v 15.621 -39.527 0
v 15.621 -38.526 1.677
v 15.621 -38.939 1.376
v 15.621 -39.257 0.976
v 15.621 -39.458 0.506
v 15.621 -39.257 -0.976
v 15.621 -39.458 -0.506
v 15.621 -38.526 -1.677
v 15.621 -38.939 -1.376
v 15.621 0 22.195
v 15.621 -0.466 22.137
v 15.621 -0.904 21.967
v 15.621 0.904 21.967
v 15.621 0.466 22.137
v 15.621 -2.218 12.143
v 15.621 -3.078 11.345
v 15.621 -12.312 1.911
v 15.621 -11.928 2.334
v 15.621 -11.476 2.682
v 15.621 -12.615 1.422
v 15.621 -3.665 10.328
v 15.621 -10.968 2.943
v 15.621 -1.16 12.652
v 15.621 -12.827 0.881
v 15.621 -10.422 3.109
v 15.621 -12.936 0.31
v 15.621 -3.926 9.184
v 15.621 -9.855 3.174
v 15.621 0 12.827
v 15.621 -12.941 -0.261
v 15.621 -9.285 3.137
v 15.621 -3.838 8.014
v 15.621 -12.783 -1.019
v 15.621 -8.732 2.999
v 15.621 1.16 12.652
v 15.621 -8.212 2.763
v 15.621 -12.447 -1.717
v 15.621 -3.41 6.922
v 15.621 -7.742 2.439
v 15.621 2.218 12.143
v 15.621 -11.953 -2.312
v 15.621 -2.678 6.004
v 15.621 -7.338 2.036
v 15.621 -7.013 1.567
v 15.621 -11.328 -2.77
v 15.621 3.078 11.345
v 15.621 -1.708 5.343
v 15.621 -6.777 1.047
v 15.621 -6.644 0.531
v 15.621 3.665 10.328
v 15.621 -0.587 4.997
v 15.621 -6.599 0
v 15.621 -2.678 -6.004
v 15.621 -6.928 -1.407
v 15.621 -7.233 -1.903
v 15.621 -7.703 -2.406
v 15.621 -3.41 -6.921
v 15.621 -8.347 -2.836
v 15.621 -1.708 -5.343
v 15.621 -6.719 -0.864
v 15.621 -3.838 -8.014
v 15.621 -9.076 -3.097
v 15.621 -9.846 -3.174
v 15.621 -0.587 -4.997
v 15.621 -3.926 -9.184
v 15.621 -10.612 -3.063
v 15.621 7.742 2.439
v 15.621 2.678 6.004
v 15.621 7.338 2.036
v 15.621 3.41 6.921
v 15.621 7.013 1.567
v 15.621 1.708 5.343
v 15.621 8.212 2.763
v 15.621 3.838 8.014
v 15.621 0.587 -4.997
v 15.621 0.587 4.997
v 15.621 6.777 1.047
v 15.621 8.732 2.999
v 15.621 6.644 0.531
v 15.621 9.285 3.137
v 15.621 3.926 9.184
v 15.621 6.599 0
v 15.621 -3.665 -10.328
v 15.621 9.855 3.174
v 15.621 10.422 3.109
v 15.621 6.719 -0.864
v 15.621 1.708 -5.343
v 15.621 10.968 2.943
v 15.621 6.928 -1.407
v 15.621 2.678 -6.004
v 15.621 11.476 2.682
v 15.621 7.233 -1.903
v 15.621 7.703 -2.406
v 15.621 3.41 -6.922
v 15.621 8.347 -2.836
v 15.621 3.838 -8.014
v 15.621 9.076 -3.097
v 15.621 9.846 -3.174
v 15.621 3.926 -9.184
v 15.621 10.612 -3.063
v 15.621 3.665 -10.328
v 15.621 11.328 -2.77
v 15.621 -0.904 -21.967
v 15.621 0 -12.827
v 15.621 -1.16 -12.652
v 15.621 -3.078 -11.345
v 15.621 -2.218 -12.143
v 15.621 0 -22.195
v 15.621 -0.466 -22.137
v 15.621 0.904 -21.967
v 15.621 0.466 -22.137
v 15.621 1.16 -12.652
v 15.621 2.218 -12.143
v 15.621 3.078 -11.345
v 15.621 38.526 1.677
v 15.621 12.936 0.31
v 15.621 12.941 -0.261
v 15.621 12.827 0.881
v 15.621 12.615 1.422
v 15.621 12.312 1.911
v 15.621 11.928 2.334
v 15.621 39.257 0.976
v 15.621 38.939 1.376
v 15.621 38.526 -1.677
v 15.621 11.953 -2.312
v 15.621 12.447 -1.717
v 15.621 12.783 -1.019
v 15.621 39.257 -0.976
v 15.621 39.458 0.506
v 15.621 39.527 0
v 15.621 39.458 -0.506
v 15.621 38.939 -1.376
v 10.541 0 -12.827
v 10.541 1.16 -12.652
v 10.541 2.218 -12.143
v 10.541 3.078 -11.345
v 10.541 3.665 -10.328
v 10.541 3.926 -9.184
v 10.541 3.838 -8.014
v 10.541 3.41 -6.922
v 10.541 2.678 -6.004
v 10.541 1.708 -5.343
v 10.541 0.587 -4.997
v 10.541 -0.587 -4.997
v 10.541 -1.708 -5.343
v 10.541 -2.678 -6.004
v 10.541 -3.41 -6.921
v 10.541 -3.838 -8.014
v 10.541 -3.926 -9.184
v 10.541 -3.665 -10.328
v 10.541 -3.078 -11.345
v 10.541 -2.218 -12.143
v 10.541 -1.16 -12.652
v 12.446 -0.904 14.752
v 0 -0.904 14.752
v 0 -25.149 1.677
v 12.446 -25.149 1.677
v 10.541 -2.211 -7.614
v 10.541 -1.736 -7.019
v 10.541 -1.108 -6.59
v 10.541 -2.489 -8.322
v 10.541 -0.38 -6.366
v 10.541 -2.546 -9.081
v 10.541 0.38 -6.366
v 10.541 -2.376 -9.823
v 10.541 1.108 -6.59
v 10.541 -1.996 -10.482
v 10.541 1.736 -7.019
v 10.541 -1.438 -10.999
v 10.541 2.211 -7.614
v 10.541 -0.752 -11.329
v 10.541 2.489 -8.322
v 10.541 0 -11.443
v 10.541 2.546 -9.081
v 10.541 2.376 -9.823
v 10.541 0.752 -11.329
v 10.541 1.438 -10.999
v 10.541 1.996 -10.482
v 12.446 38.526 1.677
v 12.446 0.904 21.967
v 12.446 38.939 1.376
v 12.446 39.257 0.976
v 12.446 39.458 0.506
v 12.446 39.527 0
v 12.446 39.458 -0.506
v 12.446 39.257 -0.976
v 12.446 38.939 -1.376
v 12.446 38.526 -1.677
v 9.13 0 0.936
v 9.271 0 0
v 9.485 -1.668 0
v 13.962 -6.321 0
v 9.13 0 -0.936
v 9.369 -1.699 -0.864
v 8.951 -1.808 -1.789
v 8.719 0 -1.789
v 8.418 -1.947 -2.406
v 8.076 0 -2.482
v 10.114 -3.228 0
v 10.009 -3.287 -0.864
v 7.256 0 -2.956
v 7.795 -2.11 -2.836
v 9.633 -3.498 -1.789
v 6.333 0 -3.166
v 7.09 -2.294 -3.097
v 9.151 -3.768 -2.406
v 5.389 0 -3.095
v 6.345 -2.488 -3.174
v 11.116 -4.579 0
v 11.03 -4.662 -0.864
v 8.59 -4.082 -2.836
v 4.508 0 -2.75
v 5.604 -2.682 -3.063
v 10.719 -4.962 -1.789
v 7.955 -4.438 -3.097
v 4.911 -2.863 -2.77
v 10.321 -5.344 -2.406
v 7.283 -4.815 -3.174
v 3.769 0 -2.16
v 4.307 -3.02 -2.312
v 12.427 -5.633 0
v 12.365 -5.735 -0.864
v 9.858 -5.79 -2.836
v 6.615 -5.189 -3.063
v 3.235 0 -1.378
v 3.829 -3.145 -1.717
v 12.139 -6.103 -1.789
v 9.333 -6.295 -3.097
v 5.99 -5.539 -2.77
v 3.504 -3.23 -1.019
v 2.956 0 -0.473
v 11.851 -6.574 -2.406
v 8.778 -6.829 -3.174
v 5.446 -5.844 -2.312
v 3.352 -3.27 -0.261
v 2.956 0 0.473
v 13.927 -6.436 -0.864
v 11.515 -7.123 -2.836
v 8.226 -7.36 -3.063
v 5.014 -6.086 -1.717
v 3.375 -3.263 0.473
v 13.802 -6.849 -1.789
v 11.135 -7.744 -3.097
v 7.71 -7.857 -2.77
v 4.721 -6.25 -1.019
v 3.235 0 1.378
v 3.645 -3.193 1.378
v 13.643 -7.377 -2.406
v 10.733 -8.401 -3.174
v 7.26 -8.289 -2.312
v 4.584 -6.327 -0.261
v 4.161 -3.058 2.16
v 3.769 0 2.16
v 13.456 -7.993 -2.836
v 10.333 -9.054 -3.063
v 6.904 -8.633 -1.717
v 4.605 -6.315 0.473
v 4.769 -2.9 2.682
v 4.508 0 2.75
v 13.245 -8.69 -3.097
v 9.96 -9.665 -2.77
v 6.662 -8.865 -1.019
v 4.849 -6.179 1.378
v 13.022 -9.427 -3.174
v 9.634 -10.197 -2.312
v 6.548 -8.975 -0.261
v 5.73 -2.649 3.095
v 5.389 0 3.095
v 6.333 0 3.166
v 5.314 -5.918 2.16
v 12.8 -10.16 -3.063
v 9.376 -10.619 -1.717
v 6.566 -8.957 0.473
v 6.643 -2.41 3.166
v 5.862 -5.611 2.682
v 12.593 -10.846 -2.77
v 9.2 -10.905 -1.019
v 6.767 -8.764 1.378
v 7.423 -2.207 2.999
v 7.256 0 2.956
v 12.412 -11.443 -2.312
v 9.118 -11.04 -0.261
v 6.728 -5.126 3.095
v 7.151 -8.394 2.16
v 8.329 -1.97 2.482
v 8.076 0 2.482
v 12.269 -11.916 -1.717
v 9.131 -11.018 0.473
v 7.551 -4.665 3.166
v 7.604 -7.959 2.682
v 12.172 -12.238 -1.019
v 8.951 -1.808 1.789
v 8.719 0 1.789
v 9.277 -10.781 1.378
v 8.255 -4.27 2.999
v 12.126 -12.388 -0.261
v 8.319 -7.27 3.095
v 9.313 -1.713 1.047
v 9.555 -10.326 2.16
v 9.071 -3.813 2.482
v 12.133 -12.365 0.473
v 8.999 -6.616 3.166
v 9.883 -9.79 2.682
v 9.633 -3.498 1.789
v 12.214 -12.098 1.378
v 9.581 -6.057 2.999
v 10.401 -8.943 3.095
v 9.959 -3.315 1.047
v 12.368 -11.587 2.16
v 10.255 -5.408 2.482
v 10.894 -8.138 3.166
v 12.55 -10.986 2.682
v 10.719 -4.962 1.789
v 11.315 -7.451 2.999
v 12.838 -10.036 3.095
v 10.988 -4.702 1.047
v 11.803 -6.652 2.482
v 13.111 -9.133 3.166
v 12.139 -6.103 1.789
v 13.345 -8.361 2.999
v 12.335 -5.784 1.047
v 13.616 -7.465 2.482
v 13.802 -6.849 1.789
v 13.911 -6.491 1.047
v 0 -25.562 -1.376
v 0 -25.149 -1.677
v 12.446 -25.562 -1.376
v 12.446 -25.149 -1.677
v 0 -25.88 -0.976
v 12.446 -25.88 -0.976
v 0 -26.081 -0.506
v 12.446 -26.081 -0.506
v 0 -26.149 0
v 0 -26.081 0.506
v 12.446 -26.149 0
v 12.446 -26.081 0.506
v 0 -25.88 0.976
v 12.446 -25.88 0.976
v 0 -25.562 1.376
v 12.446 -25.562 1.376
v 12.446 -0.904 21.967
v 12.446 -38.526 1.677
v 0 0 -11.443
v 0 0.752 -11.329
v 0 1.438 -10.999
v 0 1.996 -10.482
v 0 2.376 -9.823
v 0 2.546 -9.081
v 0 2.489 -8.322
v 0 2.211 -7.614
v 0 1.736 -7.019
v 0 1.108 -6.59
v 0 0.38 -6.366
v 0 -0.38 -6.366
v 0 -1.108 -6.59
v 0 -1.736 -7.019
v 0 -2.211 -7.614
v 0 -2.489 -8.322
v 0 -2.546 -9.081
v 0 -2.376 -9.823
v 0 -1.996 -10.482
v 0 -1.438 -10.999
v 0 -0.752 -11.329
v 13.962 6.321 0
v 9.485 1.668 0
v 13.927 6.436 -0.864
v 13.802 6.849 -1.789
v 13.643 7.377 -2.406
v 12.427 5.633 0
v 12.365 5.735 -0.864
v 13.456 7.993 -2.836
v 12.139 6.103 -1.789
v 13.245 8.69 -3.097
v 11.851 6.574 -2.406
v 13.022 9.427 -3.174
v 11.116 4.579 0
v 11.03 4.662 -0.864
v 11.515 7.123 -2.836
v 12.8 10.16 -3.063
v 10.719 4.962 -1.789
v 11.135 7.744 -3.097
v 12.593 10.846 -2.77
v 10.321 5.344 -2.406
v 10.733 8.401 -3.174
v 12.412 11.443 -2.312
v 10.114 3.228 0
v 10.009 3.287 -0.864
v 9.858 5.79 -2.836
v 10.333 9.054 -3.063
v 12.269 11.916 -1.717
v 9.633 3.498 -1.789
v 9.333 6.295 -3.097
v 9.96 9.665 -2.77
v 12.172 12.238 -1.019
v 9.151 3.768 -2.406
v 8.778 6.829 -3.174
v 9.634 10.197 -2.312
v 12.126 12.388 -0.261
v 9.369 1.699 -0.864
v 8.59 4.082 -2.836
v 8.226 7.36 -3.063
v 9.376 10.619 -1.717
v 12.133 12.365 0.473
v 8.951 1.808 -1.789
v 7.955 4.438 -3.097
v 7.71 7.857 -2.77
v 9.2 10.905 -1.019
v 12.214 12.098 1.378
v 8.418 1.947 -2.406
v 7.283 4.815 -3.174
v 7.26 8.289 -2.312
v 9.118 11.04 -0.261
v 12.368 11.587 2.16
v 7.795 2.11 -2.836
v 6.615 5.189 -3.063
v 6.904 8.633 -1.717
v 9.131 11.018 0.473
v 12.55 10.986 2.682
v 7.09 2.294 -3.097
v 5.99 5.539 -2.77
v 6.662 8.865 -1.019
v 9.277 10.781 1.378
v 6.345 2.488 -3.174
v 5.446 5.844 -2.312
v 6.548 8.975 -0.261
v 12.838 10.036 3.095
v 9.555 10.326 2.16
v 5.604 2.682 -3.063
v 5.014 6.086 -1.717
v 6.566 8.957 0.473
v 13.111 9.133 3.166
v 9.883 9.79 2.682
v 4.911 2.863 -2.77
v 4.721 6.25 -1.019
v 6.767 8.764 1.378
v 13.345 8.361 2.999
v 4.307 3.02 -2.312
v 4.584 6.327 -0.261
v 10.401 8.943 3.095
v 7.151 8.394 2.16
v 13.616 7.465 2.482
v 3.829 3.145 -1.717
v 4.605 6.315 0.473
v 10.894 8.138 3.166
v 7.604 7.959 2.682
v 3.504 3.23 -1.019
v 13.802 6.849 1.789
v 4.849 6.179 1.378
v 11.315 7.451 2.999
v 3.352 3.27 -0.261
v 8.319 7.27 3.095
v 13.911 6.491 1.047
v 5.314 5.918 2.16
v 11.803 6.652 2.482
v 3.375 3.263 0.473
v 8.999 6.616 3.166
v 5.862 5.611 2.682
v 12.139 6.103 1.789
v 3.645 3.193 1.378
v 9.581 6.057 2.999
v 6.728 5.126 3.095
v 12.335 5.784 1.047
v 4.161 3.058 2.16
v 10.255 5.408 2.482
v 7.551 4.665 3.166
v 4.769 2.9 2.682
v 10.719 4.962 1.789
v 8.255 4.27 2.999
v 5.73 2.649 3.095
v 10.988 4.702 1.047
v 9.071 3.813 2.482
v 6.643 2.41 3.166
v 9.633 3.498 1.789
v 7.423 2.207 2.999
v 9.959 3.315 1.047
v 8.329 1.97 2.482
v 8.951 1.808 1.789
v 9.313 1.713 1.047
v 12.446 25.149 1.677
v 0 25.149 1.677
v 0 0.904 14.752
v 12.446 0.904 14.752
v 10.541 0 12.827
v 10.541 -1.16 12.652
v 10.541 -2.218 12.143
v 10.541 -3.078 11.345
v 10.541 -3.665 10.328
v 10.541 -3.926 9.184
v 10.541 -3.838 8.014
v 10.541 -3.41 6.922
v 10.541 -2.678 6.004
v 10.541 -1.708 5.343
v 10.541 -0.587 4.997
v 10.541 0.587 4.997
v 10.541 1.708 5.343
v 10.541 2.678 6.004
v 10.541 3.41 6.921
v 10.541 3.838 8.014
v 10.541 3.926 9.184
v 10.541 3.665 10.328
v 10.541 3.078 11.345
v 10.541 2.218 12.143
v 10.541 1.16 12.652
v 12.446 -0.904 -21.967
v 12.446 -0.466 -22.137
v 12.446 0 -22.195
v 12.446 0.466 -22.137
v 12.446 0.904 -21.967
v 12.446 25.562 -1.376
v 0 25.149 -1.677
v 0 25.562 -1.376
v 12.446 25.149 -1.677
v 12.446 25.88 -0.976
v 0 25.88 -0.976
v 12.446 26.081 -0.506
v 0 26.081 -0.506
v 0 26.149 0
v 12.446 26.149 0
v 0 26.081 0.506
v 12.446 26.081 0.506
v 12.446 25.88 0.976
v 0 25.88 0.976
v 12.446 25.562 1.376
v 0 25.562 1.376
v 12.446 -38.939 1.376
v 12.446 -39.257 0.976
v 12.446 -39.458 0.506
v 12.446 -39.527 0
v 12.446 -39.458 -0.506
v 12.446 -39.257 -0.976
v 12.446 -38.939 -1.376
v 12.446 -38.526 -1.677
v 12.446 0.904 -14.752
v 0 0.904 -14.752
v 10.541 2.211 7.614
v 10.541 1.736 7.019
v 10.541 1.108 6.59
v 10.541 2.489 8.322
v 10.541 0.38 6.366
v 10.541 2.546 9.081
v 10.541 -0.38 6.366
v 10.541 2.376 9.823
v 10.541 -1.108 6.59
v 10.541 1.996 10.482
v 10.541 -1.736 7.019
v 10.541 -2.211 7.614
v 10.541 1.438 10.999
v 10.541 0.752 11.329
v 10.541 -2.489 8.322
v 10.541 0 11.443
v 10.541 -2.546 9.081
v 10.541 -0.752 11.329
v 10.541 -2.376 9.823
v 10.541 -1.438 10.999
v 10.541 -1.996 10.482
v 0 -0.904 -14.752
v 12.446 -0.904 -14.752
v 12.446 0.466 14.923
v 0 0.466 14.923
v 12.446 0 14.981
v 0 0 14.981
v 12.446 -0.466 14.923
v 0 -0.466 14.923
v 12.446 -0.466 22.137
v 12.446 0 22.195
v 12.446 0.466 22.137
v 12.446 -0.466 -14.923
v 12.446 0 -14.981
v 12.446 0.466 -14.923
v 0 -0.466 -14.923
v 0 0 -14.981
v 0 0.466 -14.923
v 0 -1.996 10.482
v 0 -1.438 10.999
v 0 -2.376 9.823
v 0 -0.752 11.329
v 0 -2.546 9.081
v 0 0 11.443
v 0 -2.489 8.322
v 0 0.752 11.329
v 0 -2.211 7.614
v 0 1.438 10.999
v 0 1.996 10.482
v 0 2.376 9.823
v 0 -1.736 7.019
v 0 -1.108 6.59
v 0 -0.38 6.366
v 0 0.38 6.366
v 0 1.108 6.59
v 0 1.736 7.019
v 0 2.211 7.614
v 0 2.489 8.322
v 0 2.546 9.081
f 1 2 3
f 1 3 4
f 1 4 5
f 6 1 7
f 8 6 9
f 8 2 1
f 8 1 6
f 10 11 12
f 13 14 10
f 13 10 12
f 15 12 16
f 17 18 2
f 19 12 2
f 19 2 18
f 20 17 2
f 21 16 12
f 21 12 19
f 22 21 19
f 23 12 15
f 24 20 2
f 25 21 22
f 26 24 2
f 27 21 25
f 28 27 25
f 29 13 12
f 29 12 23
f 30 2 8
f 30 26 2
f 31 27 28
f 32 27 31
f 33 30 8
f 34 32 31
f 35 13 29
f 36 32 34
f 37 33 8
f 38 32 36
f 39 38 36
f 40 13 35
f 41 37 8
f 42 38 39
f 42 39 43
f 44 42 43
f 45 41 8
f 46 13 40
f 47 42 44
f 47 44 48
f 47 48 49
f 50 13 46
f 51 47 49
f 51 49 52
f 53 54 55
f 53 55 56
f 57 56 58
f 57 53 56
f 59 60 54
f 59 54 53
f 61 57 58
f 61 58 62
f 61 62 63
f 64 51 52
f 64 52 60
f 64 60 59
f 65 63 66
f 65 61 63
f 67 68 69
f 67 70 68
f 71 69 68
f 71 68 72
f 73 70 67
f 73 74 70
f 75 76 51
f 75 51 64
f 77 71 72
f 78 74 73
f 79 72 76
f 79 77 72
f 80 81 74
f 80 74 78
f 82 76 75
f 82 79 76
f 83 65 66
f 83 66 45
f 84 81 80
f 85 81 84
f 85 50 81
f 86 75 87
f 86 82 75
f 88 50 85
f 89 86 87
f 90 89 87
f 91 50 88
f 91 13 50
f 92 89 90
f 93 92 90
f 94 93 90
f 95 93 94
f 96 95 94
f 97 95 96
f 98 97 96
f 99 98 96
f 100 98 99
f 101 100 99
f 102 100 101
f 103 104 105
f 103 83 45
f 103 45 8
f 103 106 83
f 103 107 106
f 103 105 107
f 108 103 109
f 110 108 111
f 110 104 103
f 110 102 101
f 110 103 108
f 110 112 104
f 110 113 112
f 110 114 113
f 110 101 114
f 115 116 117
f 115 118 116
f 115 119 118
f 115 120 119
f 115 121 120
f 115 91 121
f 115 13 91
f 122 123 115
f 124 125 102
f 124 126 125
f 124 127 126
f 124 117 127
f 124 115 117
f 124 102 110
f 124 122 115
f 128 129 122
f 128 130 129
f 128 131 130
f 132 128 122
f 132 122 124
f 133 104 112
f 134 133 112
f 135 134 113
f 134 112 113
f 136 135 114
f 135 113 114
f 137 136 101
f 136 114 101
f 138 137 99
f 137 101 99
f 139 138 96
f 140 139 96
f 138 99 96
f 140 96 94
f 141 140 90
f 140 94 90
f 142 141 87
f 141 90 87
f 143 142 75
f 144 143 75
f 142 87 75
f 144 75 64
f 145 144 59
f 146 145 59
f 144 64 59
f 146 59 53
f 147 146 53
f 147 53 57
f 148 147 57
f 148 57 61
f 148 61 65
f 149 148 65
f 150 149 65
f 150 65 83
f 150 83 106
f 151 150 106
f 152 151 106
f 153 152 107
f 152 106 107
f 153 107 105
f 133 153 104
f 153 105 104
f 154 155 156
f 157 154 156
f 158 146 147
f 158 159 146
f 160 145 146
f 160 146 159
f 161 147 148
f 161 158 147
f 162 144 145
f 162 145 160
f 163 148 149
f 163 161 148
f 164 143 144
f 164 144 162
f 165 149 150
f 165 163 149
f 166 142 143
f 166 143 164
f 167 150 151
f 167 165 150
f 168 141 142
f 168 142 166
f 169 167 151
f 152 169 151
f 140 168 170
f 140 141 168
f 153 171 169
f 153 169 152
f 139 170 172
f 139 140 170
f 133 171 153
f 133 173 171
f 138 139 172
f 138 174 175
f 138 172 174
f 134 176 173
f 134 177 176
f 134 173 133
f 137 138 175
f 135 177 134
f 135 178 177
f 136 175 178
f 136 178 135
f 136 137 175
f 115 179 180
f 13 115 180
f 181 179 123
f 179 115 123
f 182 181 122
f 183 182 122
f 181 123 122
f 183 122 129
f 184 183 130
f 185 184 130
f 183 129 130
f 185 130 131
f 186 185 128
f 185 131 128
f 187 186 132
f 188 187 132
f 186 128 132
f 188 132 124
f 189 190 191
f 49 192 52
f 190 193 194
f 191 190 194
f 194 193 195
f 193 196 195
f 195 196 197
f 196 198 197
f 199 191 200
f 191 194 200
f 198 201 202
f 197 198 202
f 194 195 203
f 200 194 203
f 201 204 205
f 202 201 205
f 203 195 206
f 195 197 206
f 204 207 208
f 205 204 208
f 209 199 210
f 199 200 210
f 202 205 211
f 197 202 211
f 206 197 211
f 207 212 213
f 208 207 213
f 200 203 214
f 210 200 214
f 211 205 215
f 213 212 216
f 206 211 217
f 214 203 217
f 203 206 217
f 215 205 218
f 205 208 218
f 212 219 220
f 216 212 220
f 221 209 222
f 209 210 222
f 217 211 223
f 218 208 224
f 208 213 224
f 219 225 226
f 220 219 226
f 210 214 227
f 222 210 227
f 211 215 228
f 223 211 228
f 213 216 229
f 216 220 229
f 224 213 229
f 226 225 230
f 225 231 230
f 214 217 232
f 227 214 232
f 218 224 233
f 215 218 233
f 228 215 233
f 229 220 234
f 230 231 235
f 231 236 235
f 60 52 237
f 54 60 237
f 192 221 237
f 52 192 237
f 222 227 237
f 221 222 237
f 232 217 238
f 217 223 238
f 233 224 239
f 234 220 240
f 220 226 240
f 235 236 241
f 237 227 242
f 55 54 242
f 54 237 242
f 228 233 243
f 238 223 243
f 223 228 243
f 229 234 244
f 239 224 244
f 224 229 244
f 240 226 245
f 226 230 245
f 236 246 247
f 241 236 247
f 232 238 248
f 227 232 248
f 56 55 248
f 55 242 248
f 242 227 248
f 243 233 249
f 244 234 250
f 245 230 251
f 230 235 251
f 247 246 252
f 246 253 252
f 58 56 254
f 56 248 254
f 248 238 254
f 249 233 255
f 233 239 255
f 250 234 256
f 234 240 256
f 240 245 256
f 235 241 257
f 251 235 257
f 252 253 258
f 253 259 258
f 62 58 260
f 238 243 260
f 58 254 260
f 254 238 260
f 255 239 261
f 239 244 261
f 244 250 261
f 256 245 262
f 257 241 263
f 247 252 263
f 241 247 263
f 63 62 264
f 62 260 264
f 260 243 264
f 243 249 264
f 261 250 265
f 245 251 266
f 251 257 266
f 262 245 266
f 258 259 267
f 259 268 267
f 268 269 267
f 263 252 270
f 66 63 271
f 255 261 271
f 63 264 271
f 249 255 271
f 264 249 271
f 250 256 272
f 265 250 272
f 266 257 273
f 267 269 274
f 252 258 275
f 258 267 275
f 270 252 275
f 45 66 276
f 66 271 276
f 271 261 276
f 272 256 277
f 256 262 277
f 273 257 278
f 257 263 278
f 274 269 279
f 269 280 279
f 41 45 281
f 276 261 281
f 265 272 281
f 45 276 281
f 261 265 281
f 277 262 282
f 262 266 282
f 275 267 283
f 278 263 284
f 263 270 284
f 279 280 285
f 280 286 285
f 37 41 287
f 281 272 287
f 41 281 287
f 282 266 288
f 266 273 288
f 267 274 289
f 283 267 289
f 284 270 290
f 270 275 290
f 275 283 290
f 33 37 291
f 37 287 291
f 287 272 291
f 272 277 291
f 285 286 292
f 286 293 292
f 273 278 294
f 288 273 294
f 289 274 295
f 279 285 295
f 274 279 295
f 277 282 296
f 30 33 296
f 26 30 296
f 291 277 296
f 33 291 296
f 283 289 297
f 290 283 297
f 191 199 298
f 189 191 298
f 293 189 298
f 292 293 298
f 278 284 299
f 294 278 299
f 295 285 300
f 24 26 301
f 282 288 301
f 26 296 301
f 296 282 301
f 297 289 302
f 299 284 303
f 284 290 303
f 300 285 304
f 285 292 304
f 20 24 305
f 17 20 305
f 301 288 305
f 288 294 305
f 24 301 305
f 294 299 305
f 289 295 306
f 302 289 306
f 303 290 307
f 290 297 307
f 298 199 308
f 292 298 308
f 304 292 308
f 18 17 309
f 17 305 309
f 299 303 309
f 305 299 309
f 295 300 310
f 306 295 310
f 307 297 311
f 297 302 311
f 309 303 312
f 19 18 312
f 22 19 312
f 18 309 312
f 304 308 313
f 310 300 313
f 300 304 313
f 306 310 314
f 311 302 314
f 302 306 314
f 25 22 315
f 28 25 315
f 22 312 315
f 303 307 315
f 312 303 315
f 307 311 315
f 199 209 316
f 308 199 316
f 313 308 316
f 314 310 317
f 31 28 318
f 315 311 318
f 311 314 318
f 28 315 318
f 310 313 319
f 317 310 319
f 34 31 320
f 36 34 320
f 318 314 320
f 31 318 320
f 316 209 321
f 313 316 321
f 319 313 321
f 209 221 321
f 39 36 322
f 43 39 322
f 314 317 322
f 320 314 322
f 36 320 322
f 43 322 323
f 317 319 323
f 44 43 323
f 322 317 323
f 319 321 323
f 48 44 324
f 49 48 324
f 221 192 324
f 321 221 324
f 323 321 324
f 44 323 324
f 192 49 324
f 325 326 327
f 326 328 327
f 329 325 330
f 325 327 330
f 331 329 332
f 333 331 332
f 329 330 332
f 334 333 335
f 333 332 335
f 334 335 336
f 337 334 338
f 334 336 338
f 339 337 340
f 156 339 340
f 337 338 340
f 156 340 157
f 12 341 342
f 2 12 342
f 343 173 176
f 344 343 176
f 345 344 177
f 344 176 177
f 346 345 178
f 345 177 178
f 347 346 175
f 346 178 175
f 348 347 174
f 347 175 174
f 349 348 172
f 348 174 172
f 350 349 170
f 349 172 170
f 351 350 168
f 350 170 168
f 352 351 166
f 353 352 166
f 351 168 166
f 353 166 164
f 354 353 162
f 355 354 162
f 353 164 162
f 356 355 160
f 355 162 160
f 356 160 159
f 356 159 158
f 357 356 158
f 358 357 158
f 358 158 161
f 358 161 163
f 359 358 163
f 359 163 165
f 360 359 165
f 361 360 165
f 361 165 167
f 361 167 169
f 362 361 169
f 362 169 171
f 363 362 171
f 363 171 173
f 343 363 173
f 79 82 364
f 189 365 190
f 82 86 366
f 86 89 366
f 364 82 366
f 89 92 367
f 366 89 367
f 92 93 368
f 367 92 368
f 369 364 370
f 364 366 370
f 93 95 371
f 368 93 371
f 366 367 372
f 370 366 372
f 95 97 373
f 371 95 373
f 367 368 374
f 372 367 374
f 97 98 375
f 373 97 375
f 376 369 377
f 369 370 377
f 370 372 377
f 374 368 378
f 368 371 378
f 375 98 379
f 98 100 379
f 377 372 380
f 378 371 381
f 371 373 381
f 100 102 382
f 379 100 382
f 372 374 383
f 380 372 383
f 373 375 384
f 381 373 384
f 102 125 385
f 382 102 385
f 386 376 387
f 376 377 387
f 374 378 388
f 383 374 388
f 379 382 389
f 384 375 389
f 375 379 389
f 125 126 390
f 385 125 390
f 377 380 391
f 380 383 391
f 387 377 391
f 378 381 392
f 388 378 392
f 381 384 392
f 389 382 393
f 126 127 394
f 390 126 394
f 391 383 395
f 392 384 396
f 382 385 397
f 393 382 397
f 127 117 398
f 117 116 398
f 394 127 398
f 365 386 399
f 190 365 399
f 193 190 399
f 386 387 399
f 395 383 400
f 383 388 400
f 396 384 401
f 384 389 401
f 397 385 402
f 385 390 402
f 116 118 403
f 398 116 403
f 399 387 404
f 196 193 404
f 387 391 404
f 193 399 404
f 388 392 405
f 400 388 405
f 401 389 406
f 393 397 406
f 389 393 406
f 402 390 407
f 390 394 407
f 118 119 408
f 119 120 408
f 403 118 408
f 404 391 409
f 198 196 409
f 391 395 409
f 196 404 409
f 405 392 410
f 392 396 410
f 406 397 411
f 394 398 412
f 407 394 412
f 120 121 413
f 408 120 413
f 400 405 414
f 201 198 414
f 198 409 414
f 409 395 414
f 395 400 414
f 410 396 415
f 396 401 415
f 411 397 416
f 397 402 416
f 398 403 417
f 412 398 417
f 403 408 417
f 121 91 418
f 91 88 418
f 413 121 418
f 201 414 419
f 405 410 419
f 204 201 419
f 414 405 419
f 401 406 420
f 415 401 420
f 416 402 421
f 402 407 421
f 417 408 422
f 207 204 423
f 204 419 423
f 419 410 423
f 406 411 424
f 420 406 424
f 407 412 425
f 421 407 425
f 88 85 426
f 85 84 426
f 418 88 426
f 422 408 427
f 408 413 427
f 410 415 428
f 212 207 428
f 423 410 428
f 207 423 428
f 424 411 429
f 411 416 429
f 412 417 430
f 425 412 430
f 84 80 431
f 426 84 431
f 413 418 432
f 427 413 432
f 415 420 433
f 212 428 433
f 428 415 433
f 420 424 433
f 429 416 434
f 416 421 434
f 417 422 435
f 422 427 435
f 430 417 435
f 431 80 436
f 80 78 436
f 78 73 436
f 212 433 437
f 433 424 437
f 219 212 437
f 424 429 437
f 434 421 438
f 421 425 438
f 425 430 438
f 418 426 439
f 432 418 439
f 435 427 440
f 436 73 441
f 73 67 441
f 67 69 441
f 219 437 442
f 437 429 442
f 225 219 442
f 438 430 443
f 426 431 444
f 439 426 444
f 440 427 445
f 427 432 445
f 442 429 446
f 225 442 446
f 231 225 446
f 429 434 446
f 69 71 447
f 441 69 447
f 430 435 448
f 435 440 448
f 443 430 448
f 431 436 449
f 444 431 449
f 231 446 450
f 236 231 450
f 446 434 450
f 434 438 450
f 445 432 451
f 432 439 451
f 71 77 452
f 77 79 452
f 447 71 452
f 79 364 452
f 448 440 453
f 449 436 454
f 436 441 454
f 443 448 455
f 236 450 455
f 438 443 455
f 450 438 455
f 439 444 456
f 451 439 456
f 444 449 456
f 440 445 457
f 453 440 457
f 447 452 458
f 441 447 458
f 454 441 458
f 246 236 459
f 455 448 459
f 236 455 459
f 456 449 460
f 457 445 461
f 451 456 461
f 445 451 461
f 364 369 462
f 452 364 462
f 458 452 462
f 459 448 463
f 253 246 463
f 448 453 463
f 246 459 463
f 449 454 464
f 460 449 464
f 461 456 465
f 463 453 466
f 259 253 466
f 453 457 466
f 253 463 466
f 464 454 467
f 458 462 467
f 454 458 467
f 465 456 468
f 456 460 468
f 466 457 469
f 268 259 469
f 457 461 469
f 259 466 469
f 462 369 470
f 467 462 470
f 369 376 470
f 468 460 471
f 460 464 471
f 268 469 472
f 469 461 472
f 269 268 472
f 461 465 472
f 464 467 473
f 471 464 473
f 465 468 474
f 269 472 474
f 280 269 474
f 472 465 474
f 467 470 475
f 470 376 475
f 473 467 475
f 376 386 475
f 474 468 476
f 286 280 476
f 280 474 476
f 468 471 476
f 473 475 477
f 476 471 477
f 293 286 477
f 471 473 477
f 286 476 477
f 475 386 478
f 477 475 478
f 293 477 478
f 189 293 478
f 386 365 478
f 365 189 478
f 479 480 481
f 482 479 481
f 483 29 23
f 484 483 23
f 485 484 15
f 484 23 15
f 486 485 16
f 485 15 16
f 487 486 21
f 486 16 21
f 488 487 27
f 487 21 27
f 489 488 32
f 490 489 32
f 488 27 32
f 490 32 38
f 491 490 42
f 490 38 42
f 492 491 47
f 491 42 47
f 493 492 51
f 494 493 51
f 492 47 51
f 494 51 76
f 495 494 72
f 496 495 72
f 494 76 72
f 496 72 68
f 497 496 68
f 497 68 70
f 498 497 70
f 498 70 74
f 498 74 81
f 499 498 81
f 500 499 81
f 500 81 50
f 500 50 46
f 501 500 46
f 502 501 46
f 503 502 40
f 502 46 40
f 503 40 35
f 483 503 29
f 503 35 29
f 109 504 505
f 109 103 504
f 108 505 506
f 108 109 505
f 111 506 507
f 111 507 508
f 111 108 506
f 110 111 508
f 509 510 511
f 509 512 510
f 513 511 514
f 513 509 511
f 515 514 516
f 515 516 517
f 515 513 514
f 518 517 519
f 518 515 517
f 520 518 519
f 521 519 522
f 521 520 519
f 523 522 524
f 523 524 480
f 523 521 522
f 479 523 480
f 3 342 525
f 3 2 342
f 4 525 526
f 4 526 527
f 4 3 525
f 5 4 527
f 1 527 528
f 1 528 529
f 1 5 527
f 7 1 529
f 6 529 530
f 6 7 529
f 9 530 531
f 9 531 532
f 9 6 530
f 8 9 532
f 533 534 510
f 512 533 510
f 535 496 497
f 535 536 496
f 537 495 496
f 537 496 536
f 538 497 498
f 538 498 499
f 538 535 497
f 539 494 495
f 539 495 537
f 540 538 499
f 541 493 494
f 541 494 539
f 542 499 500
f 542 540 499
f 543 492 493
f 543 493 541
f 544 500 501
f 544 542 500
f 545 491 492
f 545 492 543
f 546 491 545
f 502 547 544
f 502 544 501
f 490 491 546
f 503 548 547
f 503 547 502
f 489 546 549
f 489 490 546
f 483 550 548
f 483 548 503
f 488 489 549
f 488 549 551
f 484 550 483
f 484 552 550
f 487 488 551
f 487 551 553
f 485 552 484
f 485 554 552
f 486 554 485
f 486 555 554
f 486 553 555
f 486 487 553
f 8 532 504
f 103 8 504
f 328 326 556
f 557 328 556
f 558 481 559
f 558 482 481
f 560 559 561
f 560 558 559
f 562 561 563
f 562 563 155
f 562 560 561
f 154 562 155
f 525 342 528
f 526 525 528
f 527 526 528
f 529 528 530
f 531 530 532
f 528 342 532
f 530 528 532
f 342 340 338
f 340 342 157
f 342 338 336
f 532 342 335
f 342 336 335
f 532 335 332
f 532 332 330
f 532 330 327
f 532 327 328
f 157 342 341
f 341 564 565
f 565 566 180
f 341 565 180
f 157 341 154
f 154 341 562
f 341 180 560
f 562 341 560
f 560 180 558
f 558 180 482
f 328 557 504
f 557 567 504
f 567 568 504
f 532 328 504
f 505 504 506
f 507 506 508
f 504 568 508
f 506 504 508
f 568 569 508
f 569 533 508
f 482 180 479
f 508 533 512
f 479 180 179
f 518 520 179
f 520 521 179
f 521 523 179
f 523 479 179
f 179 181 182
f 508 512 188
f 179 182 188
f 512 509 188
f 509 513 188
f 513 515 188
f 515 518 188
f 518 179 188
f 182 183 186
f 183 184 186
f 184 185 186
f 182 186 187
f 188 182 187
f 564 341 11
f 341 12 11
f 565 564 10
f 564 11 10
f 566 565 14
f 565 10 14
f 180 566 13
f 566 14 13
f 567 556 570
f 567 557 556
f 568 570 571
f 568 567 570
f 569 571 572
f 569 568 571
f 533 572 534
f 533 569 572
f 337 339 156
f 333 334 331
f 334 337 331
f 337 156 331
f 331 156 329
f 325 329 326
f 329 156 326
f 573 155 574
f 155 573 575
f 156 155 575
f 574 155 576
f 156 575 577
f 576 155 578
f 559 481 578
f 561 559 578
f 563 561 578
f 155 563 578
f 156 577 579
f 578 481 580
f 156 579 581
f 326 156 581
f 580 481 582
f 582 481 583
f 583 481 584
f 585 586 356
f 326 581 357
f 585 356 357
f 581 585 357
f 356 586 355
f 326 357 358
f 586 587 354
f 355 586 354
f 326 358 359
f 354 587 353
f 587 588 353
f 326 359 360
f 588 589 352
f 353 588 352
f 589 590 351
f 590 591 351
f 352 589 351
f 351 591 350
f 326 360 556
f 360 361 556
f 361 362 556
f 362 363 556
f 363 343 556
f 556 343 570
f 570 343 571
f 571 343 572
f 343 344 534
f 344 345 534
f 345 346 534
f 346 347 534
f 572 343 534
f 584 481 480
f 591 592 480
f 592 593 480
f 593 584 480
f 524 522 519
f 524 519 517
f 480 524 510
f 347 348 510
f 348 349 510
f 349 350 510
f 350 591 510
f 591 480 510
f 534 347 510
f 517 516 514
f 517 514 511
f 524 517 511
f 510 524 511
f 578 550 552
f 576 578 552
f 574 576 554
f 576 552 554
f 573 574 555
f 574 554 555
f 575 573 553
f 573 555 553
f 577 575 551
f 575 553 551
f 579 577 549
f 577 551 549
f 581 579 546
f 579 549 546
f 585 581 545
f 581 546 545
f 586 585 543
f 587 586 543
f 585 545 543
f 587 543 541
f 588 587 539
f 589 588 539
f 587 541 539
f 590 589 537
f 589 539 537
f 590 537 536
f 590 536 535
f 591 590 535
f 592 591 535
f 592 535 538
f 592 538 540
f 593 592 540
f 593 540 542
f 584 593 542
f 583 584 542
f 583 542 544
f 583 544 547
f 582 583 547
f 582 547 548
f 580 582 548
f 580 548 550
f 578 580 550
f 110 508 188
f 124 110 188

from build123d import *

# Parameters (mm, degrees)
BOSS_EXTRUDE1_DEPTH = 12.446
BOSS_EXTRUDE3_DEPTH = 3.175
FILLET1_R           = 1.905
SKETCH7_R           = 3.175
SKETCH8_R           = 3.937
CUT_EXTRUDE3_DEPTH  = 5.08
SKETCH9_R           = 2.5527
CUT_EXTRUDE4_DEPTH  = 47.541246528


with BuildPart() as part:
    # Sketch1 → Boss-Extrude1 (new body)
    with BuildSketch(Plane(origin=(0, 0, 0), x_dir=(0, 0, -1), z_dir=(1, 0, 0))):
        Polygon((0, -28.2575), (15.24, 0), (0, 28.2575), (-15.24, 0), align=None)
    extrude(amount=BOSS_EXTRUDE1_DEPTH)

    # Sketch6 → Boss-Extrude3 (add)
    with BuildSketch(Plane(origin=(12.446, 0, 0), x_dir=(0, 0, -1), z_dir=(1, 0, 0))):
        Polygon((-22.454651823, 0), (0, -41.634666921), (22.454651823, 0), (0, 41.634666921), align=None)
    extrude(amount=BOSS_EXTRUDE3_DEPTH)

    # Fillet1
    fillet1_edges = [part.edges().sort_by_distance(p)[0] for p in [
        (14.0335, 41.634666921, 0),
        (14.0335, 0, 22.454651823),
        (14.0335, -41.634666921, 0),
        (14.0335, 0, -22.454651823),
        (6.223, 0, -15.24),
        (6.223, -28.2575, 0),
        (6.223, 0, 15.24),
        (6.223, 28.2575, 0),
    ]]
    fillet(fillet1_edges, radius=FILLET1_R)

    # Sketch7 → Cut-Revolve2 (revolve, cut)
    with BuildSketch(Plane(origin=(0, 0, 0), x_dir=(1, 0, 0), z_dir=(0, 1, 0))):
        with Locations((6.096, 0)):
            Circle(SKETCH7_R)
    revolve(axis=Axis((15.875, 0, 0), (0, 0, 1)), mode=Mode.SUBTRACT)

    # Sketch8 → Cut-Extrude3 (cut)
    with BuildSketch(Plane(origin=(15.621, 0, 0), x_dir=(0, 0, -1), z_dir=(1, 0, 0))):
        with Locations((8.89, 0)):
            Circle(SKETCH8_R)
        with Locations(Location((-8.89, 0, 0), (0, 0, 180))):
            Circle(SKETCH8_R)
    extrude(amount=-CUT_EXTRUDE3_DEPTH, mode=Mode.SUBTRACT)

    # Sketch9 → Cut-Extrude4 (cut, through all)
    with BuildSketch(Plane(origin=(10.541, 0, 0), x_dir=(0, 0, -1), z_dir=(1, 0, 0))):
        with Locations((8.89, 0)):
            Circle(SKETCH9_R)
        with Locations(Location((-8.89, 0, 0), (0, 0, 180))):
            Circle(SKETCH9_R)
    extrude(amount=-CUT_EXTRUDE4_DEPTH, mode=Mode.SUBTRACT)


solid = part.part
